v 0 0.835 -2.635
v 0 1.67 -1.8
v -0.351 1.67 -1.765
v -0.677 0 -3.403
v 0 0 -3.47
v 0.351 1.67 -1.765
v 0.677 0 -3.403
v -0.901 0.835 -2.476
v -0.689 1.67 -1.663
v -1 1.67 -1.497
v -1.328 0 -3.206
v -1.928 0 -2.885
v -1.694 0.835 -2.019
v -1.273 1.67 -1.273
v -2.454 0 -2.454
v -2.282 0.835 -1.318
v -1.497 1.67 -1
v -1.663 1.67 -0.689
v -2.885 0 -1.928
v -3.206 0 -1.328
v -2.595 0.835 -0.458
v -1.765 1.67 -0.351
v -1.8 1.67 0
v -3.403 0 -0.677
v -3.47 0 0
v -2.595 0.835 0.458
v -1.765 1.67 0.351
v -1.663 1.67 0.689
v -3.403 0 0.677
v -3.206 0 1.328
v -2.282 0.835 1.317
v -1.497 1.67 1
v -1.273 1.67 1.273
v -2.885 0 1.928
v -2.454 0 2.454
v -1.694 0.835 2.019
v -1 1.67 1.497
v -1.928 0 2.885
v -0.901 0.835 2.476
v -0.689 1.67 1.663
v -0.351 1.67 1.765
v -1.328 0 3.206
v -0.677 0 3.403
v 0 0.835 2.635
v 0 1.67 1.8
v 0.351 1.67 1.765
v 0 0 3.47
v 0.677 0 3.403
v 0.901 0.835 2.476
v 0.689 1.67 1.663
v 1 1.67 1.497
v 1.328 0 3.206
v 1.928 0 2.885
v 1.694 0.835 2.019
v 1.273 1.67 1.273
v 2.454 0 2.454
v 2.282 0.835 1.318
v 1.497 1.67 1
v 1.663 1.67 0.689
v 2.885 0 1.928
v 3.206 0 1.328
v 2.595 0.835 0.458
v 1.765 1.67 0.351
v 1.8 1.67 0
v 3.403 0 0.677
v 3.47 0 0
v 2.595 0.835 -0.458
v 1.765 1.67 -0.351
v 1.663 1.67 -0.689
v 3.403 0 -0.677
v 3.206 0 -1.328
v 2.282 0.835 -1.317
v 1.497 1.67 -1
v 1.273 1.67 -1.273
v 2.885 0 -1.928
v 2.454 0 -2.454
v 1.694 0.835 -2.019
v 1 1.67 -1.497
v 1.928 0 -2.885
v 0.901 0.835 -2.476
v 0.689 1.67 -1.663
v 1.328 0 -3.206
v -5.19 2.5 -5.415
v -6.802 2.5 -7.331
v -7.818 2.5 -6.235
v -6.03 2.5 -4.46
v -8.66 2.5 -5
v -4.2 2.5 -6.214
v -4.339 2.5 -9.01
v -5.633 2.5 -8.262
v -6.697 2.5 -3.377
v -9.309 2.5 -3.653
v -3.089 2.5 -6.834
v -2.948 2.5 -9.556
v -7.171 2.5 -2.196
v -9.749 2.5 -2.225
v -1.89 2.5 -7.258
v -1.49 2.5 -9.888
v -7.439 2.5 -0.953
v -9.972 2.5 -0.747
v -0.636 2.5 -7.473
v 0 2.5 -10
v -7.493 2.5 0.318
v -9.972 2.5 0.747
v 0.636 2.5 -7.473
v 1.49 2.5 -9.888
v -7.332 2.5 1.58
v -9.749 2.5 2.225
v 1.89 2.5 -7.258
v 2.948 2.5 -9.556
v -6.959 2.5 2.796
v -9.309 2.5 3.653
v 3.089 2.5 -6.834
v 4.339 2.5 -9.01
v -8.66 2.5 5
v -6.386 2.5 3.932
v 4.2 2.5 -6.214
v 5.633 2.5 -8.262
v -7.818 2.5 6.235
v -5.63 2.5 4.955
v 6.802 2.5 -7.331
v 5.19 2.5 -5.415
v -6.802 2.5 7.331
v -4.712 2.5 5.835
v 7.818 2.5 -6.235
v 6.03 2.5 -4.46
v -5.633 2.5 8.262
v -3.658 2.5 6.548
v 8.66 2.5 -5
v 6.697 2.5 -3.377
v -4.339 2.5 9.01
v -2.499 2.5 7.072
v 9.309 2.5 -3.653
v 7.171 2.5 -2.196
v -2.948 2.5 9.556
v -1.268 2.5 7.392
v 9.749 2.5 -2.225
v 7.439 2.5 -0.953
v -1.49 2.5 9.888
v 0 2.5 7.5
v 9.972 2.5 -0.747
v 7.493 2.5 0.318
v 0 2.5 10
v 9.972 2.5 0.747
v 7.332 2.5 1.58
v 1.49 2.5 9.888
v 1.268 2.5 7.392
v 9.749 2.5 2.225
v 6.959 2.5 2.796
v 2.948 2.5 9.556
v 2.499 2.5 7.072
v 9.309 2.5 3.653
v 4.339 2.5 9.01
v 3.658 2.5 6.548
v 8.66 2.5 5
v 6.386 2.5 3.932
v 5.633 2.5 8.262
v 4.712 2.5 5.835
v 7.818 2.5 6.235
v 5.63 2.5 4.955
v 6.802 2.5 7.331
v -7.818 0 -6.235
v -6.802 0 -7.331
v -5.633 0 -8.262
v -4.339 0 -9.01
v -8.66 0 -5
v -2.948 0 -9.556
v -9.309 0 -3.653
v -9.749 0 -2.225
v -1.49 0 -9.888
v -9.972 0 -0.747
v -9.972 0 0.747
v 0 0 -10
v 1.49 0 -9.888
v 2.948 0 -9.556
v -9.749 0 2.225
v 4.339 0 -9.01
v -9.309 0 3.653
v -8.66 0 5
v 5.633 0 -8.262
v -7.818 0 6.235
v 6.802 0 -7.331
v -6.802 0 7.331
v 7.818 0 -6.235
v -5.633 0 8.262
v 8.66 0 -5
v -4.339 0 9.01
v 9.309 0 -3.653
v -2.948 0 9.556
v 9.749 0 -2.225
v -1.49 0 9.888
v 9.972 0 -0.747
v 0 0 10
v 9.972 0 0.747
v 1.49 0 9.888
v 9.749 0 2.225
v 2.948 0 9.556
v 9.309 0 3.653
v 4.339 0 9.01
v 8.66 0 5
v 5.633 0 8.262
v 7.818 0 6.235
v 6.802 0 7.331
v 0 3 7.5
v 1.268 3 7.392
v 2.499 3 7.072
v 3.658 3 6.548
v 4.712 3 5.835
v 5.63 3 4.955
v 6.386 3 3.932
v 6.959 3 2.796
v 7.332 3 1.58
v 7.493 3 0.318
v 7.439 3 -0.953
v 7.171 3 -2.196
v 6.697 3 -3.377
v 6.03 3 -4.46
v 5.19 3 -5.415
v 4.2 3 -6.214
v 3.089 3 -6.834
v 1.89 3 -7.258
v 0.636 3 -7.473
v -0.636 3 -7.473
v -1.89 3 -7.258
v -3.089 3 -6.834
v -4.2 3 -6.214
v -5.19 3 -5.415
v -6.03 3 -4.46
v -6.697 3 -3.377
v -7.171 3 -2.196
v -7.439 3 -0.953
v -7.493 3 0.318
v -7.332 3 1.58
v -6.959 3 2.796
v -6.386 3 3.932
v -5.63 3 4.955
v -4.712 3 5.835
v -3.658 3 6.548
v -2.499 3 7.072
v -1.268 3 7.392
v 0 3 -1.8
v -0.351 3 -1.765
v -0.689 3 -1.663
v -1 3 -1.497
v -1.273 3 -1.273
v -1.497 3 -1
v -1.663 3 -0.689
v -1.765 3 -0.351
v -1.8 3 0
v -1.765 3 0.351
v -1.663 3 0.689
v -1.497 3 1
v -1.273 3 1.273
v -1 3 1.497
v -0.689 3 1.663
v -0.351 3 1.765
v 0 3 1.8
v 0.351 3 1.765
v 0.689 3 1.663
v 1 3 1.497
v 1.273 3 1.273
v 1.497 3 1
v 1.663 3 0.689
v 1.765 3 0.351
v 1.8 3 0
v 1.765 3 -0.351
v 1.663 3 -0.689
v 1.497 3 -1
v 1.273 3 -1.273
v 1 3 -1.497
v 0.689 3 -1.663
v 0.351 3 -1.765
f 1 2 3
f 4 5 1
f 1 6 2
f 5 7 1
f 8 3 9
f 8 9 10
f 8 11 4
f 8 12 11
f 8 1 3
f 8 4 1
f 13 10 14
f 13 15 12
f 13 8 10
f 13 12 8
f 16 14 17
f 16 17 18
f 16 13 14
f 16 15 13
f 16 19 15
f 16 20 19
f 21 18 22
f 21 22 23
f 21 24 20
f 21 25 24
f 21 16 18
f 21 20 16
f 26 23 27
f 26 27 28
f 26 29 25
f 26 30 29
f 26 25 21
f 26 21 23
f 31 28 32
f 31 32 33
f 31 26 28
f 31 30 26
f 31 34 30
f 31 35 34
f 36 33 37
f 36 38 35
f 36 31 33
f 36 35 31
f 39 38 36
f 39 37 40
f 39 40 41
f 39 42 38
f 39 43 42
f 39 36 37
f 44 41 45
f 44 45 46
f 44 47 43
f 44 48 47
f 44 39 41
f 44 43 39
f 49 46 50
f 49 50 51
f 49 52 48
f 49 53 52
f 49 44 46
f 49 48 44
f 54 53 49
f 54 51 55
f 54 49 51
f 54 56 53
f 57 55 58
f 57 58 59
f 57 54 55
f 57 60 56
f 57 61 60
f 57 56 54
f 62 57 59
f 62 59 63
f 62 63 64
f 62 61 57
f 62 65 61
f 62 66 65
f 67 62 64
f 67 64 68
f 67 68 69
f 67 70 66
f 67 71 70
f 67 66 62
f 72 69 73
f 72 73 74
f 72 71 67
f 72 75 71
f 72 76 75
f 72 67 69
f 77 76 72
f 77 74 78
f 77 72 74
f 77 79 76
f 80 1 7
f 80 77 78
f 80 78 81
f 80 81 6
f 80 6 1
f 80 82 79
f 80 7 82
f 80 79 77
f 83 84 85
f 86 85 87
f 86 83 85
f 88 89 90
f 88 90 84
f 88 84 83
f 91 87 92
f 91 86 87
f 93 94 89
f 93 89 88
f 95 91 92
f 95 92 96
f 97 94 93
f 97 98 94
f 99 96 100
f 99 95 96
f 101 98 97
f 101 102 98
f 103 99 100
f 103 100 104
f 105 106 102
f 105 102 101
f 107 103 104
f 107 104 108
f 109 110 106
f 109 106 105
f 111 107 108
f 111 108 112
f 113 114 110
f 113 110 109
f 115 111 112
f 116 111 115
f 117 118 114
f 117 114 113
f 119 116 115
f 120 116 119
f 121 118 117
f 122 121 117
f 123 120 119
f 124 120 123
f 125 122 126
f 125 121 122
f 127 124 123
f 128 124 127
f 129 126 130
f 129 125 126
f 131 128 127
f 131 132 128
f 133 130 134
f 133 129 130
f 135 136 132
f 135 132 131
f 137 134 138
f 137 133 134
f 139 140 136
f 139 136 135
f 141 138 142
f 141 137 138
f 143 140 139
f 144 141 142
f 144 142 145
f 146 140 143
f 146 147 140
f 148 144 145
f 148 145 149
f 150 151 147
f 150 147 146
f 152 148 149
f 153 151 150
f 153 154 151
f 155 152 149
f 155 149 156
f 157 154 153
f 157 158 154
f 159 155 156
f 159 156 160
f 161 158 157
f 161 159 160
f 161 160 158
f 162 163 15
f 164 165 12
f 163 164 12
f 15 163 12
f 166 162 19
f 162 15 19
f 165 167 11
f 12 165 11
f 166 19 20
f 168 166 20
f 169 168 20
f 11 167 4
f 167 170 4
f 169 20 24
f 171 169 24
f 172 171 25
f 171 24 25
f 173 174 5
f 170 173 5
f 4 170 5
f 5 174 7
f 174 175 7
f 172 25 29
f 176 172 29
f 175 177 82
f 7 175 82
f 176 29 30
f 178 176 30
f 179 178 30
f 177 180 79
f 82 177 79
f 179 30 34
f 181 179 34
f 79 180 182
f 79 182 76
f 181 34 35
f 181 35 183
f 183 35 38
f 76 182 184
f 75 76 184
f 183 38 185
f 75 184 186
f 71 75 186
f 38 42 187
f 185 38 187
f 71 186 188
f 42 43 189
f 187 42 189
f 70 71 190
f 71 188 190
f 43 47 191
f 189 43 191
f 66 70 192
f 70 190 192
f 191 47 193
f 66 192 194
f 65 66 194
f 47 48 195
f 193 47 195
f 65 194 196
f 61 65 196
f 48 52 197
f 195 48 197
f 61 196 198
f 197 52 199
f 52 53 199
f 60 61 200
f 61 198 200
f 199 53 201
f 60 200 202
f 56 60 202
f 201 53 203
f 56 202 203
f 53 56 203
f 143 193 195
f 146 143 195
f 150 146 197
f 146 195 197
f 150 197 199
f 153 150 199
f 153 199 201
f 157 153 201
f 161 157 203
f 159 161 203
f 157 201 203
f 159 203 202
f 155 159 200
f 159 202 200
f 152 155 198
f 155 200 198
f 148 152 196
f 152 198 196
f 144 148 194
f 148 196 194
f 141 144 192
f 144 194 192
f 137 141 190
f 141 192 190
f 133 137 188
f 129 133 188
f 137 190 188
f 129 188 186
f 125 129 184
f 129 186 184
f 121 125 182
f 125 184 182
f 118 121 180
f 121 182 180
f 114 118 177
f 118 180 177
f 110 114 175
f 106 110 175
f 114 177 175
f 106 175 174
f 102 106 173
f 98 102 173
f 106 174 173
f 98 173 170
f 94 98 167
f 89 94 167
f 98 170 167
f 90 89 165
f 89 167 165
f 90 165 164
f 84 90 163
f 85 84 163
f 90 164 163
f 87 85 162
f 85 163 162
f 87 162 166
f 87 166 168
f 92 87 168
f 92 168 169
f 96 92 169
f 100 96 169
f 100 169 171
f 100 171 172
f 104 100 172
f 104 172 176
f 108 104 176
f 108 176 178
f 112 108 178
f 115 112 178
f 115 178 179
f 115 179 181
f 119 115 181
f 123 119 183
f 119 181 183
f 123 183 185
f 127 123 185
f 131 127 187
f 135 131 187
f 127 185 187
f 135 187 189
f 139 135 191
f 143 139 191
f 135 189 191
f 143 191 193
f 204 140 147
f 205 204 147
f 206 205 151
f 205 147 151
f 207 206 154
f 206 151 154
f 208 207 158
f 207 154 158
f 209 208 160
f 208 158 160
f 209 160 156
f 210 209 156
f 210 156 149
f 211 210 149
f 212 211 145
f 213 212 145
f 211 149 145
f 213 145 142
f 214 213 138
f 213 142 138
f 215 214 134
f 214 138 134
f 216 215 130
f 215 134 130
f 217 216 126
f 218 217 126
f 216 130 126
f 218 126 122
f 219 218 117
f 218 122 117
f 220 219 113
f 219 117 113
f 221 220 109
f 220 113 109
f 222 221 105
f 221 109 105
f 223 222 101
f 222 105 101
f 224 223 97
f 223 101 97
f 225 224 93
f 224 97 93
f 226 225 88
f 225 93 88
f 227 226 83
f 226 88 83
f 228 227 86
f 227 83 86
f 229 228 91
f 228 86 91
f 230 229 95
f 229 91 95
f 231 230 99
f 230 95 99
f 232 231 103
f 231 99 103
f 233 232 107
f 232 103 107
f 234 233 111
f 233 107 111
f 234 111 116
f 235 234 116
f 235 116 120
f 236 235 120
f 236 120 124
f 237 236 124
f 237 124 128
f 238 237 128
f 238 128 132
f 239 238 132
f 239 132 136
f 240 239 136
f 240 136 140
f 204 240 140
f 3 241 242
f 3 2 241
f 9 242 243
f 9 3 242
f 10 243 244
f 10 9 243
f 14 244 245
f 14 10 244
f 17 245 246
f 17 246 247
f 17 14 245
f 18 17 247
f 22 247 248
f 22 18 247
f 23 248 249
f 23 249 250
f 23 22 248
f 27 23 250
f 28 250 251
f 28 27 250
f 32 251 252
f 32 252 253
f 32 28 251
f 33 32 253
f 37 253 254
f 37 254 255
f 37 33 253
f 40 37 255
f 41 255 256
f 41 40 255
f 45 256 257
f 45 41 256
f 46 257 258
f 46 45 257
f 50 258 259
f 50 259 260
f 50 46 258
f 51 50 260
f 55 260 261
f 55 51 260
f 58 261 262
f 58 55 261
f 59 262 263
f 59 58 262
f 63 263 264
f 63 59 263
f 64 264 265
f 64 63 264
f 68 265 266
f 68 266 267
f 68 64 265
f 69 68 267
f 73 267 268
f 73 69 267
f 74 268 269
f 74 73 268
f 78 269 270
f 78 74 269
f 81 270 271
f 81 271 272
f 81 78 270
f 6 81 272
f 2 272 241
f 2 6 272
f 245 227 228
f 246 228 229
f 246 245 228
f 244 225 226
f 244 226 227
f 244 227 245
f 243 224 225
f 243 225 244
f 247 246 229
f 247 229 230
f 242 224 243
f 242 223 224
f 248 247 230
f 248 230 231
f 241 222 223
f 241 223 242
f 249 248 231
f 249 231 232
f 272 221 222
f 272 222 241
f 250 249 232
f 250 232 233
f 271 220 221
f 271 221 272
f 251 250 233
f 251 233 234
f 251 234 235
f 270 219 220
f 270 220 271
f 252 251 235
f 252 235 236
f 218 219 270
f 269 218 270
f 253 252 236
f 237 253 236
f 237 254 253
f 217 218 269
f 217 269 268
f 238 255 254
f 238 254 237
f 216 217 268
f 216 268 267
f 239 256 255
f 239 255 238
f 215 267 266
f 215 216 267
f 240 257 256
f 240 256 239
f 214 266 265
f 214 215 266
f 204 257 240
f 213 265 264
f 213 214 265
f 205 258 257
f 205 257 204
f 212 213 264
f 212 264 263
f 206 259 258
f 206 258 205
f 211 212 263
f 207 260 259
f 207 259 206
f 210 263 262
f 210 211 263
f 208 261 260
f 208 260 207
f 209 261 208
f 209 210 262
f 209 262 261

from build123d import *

# Parameters (mm, degrees)
SKETCH1_R           = 10
BOSS_EXTRUDE1_DEPTH = 2.5
SKETCH2_R           = 7.5
BOSS_EXTRUDE2_DEPTH = 0.5


with BuildPart() as part:
    # Sketch1 → Boss-Extrude1 (new body)
    with BuildSketch(Plane(origin=(0, 0, 0), x_dir=(1, 0, 0), z_dir=(0, 1, 0))):
        with Locations(Location((0, 0, 0), (0, 0, 270))):
            Circle(SKETCH1_R)
    extrude(amount=BOSS_EXTRUDE1_DEPTH)

    # Sketch2 → Boss-Extrude2 (add)
    with BuildSketch(Plane(origin=(0, 2.5, 0), x_dir=(1, 0, 0), z_dir=(0, 1, 0))):
        with Locations(Location((0, 0, 0), (0, 0, 270))):
            Circle(SKETCH2_R)
    extrude(amount=BOSS_EXTRUDE2_DEPTH)

    # Sketch4 → CSK for M3 Hex Socket Countersunk Head Screw1 (revolve, cut)
    with BuildSketch(Plane(origin=(0, 0, 0), x_dir=(0, 0, -1), z_dir=(1, 0, 0))):
        Polygon((0, 0), (0, 3), (1.8, 3), (1.8, 1.67), (3.47, 0), align=None)
    revolve(axis=Axis((0, -6.35, 0), (0, 1, 0)), mode=Mode.SUBTRACT)


solid = part.part
